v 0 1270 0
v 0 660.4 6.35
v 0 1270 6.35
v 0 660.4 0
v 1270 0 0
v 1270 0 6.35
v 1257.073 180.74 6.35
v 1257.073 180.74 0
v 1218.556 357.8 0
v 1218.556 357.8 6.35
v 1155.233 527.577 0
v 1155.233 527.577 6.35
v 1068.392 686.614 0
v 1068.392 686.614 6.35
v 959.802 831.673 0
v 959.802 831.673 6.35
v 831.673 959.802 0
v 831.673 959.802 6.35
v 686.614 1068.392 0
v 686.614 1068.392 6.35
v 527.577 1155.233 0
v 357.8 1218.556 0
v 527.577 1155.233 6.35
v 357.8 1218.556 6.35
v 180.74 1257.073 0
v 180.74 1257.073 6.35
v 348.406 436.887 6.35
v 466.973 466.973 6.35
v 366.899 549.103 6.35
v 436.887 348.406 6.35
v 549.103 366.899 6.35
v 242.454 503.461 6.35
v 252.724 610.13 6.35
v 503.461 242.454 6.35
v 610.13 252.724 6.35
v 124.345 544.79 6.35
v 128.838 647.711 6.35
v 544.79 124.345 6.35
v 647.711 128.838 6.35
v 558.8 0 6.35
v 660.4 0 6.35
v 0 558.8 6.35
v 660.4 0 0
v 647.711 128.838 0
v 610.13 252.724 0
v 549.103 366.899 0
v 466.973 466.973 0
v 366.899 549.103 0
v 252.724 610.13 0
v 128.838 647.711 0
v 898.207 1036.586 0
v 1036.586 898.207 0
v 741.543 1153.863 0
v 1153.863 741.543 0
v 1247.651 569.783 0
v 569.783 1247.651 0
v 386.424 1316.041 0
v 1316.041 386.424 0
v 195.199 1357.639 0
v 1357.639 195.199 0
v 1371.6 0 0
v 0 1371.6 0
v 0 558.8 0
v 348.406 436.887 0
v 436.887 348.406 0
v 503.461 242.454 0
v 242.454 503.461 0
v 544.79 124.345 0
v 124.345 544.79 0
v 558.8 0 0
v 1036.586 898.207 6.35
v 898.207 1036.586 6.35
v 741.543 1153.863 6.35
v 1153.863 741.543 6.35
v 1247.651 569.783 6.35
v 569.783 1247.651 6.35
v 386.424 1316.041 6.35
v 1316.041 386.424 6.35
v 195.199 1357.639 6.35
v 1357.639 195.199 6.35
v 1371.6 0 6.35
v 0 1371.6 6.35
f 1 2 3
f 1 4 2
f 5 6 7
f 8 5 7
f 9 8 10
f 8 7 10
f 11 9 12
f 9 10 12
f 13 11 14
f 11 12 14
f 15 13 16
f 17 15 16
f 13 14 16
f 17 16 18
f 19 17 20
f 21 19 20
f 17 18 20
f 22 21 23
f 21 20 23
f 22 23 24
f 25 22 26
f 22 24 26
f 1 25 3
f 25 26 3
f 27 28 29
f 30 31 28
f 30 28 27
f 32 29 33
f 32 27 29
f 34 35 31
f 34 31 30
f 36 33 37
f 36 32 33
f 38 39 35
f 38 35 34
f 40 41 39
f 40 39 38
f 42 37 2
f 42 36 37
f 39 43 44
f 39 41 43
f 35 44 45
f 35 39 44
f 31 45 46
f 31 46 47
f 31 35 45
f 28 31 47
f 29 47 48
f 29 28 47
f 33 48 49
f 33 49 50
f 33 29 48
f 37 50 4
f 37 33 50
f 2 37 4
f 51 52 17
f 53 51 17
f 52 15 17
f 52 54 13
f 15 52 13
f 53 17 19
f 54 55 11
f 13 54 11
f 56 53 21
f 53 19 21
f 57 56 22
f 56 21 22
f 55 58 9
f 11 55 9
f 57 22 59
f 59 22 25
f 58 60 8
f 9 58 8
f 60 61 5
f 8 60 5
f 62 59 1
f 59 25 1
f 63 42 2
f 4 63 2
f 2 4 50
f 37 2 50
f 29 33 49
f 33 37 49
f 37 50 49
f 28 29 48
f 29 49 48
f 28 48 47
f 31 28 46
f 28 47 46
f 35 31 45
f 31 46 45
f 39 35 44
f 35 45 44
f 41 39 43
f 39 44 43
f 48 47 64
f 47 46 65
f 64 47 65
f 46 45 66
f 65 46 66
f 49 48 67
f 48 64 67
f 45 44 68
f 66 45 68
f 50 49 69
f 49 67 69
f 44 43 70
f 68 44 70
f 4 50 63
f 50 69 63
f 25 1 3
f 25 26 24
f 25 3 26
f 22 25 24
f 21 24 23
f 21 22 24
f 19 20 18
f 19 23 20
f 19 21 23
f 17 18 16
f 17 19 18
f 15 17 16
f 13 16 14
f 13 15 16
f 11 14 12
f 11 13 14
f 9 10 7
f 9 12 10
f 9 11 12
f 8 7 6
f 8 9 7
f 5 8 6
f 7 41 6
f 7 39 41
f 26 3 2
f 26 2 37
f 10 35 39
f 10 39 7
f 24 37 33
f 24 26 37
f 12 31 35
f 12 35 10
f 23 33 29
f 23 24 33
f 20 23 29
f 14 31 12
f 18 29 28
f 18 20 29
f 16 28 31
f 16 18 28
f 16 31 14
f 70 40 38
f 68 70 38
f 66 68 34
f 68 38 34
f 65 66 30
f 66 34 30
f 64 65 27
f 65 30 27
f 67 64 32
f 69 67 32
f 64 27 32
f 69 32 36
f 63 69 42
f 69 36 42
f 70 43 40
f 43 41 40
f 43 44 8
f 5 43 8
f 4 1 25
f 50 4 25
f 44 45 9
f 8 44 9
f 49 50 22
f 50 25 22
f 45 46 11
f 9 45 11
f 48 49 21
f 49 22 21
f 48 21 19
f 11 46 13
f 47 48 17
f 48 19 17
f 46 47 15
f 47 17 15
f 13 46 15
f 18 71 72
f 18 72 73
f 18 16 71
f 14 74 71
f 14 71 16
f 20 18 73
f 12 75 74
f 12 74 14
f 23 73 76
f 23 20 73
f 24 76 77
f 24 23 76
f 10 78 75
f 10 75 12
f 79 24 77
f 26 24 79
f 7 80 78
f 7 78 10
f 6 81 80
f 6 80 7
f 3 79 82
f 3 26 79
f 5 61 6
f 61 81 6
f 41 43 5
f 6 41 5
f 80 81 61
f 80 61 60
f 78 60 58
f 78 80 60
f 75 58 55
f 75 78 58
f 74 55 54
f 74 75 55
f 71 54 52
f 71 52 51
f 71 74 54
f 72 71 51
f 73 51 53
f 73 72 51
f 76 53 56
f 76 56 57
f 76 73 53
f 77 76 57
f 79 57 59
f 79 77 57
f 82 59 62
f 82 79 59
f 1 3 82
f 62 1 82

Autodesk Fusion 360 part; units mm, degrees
sketch "Sketch1" plane through (0, 0, 0) normal (0, 0, 1) x (1, 0, 0)
  circle A0 centre (0, 0) radius 660.4
  circle A1 centre (0, 0) radius 1270
  line L0 (0, 0) -> (0, 1270)
  line L1 (0, 0) -> (1270, 0)
  dimension "d1" = 1320.8
  dimension "d2" = 609.6
extrude "Extrude1" add sketch "Sketch1" along normal blind 6.35 contours A0 A1 L0 L1 picked at (60.2466, 1062.4911) makes body 1
sketch "Sketch2" plane through (0, 0, 6.35) normal (0, 0, 1) x (-1, 0, 0)
  line L0 (-660.4, 0) -> (-1270, 0)
  arc A0 (-1270, 0) -> (0, -1270) centre (0, 0) ccw
  line L1 (0, -1270) -> (0, -660.4)
  arc A1 (-660.4, 0) -> (0, -660.4) centre (0, 0) ccw
  arc A2 (-549.486, 101.6) -> (101.6, -549.486) centre (0, 0) ccw
  line L2 (101.6, -1367.8319) -> (101.6, -549.486)
  arc A3 (-1367.8319, 101.6) -> (101.6, -1367.8319) centre (0, 0) ccw
  line L3 (-549.486, 101.6) -> (-1367.8319, 101.6)
  line L4 (101.6, -549.486) -> (0, -549.486)
  line L5 (0, -549.486) -> (0, -1425.6301)
  line L6 (0, -1425.6301) -> (101.6, -1425.6301)
  line L7 (101.6, -1425.6301) -> (101.6, -549.486)
  line L8 (-549.486, 101.6) -> (-1530.0637, 101.6)
  line L9 (-1530.0637, 101.6) -> (-1530.0637, 0)
  line L10 (-1530.0637, 0) -> (-549.486, 0)
  line L11 (-549.486, 0) -> (-549.486, 101.6)
  dimension "d5" = 101.6
  dimension "d6" = 101.6
  dimension "d7" = 980.5776
  dimension "d8" = 101.6
extrude "Extrude1'" add sketch "Sketch2" against normal blind 6.35 separate body contours A1 A2 L5 L10 | A0 A3 L5 L10 makes body 2 at (624.2927, 31.3282, 6.35) makes body 3 at (1310.251, 254.1211, 6.35) in component "90"
copy_body "CutPasteBodies1" bodies 1 removing the originals makes body 4 in component "90"
component "90" placed x (1, 0, 0) y (0, 1, 0) z (0, 0, 1) at (0, 0, 0)
